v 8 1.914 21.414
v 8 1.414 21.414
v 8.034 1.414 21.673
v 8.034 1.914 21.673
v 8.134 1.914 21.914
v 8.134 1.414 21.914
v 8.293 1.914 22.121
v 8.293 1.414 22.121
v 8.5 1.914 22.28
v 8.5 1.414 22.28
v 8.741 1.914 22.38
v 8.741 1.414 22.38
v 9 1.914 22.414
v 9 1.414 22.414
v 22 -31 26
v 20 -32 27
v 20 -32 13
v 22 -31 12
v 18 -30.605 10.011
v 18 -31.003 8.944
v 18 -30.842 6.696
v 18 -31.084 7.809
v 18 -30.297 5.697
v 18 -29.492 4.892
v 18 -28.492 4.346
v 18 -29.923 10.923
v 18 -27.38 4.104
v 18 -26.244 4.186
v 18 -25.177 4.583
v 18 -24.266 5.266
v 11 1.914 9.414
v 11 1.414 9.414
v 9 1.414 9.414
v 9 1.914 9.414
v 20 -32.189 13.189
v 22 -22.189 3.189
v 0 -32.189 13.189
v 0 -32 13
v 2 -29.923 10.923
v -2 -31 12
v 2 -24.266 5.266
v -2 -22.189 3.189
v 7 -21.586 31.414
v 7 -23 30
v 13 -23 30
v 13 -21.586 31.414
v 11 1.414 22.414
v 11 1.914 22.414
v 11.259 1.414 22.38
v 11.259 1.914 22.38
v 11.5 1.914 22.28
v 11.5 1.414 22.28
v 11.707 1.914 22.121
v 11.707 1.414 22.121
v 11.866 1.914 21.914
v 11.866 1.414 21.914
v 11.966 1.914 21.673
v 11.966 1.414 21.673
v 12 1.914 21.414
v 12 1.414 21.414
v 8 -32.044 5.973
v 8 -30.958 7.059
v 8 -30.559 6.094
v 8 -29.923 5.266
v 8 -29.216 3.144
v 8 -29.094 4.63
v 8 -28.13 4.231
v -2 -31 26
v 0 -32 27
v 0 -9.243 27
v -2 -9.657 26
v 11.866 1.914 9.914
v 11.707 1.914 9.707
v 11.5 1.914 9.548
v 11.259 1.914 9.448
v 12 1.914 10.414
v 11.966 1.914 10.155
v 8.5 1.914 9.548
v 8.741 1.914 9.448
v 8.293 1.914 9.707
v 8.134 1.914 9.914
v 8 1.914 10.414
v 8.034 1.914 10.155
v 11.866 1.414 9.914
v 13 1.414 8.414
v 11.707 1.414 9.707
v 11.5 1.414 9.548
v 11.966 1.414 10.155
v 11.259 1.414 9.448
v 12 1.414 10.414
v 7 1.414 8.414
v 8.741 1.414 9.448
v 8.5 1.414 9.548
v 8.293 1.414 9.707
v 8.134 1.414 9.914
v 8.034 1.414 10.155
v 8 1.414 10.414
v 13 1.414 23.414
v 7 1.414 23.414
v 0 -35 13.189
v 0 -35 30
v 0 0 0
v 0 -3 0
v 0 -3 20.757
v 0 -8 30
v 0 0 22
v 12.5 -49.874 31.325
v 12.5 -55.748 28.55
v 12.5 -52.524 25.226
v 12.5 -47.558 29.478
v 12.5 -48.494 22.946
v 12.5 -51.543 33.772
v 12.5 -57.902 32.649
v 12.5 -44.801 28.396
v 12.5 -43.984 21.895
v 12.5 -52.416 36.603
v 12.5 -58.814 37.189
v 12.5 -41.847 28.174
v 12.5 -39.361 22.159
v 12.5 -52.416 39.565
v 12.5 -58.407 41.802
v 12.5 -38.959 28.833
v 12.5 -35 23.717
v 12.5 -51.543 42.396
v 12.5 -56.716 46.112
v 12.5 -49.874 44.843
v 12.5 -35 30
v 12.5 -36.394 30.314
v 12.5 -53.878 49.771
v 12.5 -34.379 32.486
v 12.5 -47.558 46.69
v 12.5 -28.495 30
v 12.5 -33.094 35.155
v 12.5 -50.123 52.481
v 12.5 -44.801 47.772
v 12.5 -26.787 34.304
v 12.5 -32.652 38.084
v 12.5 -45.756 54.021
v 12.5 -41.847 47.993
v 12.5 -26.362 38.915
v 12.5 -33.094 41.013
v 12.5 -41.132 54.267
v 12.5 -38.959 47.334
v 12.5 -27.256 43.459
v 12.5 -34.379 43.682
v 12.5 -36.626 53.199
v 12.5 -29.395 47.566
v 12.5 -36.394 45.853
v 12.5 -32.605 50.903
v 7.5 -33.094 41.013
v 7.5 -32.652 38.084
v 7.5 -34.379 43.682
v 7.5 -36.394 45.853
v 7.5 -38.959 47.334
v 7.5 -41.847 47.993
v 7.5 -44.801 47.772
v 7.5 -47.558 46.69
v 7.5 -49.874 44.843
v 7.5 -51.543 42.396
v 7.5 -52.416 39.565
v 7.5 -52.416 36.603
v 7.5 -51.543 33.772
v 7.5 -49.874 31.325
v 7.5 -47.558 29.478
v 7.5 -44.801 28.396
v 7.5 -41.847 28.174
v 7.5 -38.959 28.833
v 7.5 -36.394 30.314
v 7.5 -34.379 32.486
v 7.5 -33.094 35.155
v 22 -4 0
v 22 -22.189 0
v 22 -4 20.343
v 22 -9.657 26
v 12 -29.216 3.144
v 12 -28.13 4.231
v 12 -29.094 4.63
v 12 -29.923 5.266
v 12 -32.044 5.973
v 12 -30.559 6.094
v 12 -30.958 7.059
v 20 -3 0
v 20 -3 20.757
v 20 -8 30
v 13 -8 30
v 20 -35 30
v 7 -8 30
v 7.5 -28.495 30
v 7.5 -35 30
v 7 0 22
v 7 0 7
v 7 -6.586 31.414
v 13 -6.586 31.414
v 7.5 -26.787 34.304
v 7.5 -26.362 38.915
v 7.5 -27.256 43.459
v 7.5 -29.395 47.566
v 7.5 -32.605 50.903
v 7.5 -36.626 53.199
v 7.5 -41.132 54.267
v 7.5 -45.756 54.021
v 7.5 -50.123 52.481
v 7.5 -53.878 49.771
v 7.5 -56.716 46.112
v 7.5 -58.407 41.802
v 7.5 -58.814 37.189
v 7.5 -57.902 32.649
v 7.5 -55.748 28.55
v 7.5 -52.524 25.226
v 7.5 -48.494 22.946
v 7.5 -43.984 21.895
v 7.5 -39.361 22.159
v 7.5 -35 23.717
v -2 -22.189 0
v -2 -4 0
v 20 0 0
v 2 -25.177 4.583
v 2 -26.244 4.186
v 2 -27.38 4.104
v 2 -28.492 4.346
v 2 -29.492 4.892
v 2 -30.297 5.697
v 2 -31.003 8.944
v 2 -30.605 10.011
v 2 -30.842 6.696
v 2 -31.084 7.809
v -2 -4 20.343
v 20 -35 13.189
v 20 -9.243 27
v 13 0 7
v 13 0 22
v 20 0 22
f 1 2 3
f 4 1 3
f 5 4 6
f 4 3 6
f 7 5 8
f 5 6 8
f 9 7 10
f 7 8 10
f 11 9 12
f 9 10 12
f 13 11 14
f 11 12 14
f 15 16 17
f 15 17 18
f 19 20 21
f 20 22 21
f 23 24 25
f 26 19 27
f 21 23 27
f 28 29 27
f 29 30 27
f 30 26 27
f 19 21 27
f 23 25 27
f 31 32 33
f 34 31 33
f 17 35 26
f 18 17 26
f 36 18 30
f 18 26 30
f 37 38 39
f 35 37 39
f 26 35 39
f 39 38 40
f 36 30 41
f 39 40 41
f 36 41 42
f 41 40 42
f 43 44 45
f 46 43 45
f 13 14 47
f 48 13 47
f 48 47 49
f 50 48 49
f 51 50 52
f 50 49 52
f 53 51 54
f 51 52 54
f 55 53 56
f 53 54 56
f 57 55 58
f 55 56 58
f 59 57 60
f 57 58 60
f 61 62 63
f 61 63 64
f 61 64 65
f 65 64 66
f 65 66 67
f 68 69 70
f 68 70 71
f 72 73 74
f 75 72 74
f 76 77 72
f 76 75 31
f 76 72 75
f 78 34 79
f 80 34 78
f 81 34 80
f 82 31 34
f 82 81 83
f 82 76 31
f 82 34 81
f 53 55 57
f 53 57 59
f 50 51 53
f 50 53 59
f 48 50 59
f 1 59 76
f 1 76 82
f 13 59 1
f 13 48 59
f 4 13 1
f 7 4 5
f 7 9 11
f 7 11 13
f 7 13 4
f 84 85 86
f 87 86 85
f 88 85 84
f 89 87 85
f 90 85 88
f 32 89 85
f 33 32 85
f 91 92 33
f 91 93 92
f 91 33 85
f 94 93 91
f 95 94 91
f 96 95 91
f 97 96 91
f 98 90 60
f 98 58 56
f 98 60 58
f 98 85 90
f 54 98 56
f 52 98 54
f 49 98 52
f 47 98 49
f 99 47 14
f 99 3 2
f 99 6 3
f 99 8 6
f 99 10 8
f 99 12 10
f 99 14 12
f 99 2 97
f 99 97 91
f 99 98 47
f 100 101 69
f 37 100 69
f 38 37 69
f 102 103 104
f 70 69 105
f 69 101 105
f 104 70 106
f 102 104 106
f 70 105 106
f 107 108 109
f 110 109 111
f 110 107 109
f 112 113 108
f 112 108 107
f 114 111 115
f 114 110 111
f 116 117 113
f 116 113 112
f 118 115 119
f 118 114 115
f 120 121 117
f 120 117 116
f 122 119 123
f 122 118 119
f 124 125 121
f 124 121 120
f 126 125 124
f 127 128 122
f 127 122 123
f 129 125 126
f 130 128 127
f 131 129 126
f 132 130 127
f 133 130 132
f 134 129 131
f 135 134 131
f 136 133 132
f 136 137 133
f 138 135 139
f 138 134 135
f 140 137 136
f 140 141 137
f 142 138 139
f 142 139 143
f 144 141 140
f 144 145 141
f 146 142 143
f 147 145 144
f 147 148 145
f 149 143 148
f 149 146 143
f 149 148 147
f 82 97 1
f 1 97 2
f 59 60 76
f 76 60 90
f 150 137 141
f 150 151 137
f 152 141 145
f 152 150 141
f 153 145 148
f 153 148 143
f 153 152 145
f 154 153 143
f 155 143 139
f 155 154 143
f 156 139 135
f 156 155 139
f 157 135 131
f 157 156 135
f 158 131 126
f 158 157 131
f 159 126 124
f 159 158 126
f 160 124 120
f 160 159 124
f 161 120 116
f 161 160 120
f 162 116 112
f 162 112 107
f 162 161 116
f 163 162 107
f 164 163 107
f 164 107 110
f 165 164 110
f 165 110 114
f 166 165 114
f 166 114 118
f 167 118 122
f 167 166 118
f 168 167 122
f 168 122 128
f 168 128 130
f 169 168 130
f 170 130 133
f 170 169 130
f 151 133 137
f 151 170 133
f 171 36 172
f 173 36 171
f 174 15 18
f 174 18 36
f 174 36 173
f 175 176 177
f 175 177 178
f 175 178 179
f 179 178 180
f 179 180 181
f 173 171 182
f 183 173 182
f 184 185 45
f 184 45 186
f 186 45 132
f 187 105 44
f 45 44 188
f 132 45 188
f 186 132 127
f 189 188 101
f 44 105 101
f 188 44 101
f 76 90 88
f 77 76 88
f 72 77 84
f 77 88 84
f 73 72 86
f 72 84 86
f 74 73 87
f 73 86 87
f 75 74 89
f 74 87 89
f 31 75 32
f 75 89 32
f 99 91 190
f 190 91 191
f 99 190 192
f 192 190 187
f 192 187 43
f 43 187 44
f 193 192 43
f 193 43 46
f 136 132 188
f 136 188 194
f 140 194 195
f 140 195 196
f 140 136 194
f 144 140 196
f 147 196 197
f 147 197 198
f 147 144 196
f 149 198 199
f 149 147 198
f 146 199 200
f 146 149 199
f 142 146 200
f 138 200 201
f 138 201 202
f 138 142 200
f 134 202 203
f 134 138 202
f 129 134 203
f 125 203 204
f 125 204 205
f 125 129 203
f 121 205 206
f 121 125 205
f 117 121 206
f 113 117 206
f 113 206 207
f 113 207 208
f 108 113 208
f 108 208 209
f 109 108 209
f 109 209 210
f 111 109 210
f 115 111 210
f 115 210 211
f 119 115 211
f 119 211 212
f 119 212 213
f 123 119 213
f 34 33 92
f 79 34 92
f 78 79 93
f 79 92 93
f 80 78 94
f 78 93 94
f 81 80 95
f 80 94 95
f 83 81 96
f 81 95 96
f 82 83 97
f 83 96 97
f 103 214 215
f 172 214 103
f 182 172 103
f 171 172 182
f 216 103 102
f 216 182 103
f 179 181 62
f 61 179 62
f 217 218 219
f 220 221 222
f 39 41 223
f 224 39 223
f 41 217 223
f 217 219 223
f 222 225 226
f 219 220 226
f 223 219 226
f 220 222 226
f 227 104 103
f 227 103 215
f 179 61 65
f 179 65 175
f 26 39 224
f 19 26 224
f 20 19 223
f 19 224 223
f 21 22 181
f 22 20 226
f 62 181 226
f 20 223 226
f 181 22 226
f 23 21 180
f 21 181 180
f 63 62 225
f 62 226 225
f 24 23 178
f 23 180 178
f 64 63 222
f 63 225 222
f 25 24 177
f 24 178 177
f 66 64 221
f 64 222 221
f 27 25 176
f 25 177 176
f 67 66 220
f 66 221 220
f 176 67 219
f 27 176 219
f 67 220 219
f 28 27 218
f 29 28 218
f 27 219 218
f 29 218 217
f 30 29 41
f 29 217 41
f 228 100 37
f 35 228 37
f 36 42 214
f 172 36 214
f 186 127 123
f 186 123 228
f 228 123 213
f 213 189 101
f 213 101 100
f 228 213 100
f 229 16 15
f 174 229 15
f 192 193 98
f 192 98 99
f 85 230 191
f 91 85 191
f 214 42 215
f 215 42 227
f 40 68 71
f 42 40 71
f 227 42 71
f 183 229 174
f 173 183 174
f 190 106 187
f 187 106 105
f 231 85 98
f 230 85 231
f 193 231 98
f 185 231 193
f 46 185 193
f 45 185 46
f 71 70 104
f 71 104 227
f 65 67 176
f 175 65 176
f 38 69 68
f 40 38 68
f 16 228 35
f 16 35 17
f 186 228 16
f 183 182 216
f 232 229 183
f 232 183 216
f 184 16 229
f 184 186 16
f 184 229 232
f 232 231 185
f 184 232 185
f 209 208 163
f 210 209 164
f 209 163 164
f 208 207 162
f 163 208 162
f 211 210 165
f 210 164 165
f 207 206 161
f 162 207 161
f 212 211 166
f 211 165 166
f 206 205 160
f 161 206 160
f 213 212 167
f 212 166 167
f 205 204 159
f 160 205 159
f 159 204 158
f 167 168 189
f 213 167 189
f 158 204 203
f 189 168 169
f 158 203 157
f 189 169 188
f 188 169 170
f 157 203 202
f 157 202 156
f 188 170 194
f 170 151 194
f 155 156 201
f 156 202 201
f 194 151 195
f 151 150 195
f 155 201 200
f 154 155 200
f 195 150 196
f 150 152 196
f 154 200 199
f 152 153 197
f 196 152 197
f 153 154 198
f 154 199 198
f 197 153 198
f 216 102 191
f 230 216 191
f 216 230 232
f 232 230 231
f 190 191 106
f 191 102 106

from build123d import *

# Parameters (mm, degrees)
F2_DEPTH       = 20
F3_DEPTH       = 22
F3_DEPTH_BACK  = 2
F1_W           = 29
F1_H           = 3
F7_DEPTH       = 22
F7_DEPTH_BACK  = 2
F5_W           = 6
F5_H           = 11.313708499
F4_W           = 6
F4_H           = 15
F6_W           = 6
F6_H           = 15
F8_DEPTH       = 2
F10_DEPTH      = 25
F12_DEPTH      = 5
F15_DEPTH      = 0.5
F16_R          = 16.2487088964
F16_R_2        = 9.9373882072
F17_DEPTH      = 2.5
F17_DEPTH_BACK = 2.5
F18_T4_DEPTH   = 31.116674808
F18_T9_DEPTH   = 19.1877426199
F18_T14_DEPTH  = 33.116674808
F18_T19_DEPTH  = 24.3595810189
F18_T24_DEPTH  = 24.3595810189
F18_T29_DEPTH  = 33.116674808
F18_T34_DEPTH  = 19.1877426199
F18_T39_DEPTH  = 31.116674808


# Not quite as in the source:
# - a fillet or chamfer that OpenCascade refuses, or shapes differently, is made with other operations: its cross-section is extruded or revolved along the edge and cut away or added
# - two fillets or chamfers of one size are made in one step


with BuildPart() as f2:
    # F1 (on Right) → F2 (new body)
    with BuildSketch(Plane.YZ):
        Polygon((-35, 30), (-35, 0), (-32, 0), (-32, 3), (-32, 27), (-9.2426406871, 27), (-3, 20.7573593129), (-3, 3), (-3, 0), (0, 0), (0, 22), (-8, 30), align=None)
    extrude(amount=F2_DEPTH)

    # F1 (on Right) → F3 (join, two sides)
    with BuildSketch(Plane.YZ) as f3_sk:
        Polygon((-32, 27), (-32, 3), (-3, 3), (-3, 20.7573593129), (-9.2426406871, 27), align=None)
    extrude(amount=F3_DEPTH)
    extrude(f3_sk.sketch, amount=-F3_DEPTH_BACK)

    # F1 (on Right) → F7 (join, two sides)
    with BuildSketch(Plane.YZ) as f7_sk:
        with Locations((-17.5, 1.5)):
            Rectangle(F1_W, F1_H)
    extrude(amount=F7_DEPTH)
    extrude(f7_sk.sketch, amount=-F7_DEPTH_BACK)

    # F5 (on face) + F4 (on face) + F6 (on face) → F8 (join)
    with BuildSketch(Plane(origin=(0, 11, 11), x_dir=(-1, 0, 0), z_dir=(0, 0.7071067812, 0.7071067812))):
        with Locations((-10, 21.2132034356)):
            Rectangle(F5_W, F5_H)
    with BuildSketch(Plane(origin=(0, 0, 0), x_dir=(-1, 0, 0), z_dir=(0, 1, 0))):
        with Locations((-10, 14.5)):
            Rectangle(F4_W, F4_H)
    with BuildSketch(Plane.XY.offset(30)):
        with Locations((10, -15.5)):
            Rectangle(F6_W, F6_H)
    extrude(amount=F8_DEPTH, dir=(0, 0.7071067812, 0.7071067812))

    # F9 (on face) → F10 (cut)
    with BuildSketch(Plane(origin=(-2, 0, 0), x_dir=(0, -1, 0), z_dir=(-1, 0, 0))):
        Polygon((22.18895033, -6.8113151938), (42.18895033, -6.8113151938), (42.18895033, 13.1886848062), (32.18895033, 13.1886848062), (32, 12.9997344762), (32, 0), (22.18895033, 0), align=None)
        Polygon((22.18895033, 3.1886848062), (22.18895033, 0), (32, 0), (32, 12.9997344762), align=None)
    extrude(amount=-F10_DEPTH, mode=Mode.SUBTRACT)

    # F11 (on face) → F12 (join)
    with BuildSketch(Plane(origin=(0, -9.5001327619, -9.5001327619), x_dir=(1, 0, 0), z_dir=(0, -0.7071067812, -0.7071067812))):
        Polygon((8, 26.8821576475), (8, 24.8821576475), (8, 22.8821576475), (12, 22.8821576475), (12, 24.8821576475), (12, 26.8821576475), align=None)
    extrude(amount=F12_DEPTH)

    # F11 (on face) → F13 (revolve)
    with BuildSketch(Plane(origin=(0, -9.5001327619, -9.5001327619), x_dir=(1, 0, 0), z_dir=(0, -0.7071067812, -0.7071067812))):
        Polygon((2, 28.8821576475), (2, 24.8821576475), (8, 24.8821576475), (8, 26.8821576475), (12, 26.8821576475), (12, 24.8821576475), (18, 24.8821576475), (18, 28.8821576475), align=None)
    revolve(axis=Axis((5, -27.094475165, 8.0942096412), (1, 0, 0)))

    # F14 (on face) → F15 (join)
    with BuildSketch(Plane(origin=(0, 1.4142135624, 0), x_dir=(-1, 0, 0), z_dir=(0, 1, 0))):
        with BuildLine():
            Line((-12, 21.4142135624), (-12, 10.4142135624))
            ThreePointArc((-12, 10.4142135624), (-11.7071067812, 9.7071067812), (-11, 9.4142135624))
            Line((-11, 9.4142135624), (-9, 9.4142135624))
            ThreePointArc((-9, 9.4142135624), (-8.2928932188, 9.7071067812), (-8, 10.4142135624))
            Line((-8, 10.4142135624), (-8, 21.4142135624))
            ThreePointArc((-8, 21.4142135624), (-8.2928932188, 22.1213203436), (-9, 22.4142135624))
            Line((-9, 22.4142135624), (-11, 22.4142135624))
            ThreePointArc((-11, 22.4142135624), (-11.7071067812, 22.1213203436), (-12, 21.4142135624))
        make_face()
    extrude(amount=F15_DEPTH)

    # F16 (on offset) → F17 (join, two sides)
    with BuildSketch(Plane.YZ.offset(10)) as f17_sk:
        with Locations((-42.5896607339, 38.0838625133)):
            Circle(F16_R)
        with Locations((-42.5896607339, 38.0838625133)):
            Circle(F16_R_2, mode=Mode.SUBTRACT)
    extrude(amount=F17_DEPTH)
    extrude(f17_sk.sketch, amount=-F17_DEPTH_BACK)

    # F18: chamfer of 2 x 1 on 8 edges, made by hand


with BuildPart() as f18_tool2:
    # F18_s3 → F18_t4 (new body)
    with BuildSketch(Plane.XY.offset(-5.1796577476)):
        Polygon((0, -3), (-2, -4), (-2, -3), align=None)
    extrude(amount=F18_T4_DEPTH)

    split(bisect_by=Plane.YZ, keep=Keep.BOTTOM)


with BuildPart() as f2_1:
    add(f2.part)

    # F18_t1: cut F18_tool2
    add(f18_tool2.part, mode=Mode.SUBTRACT)


with BuildPart() as f18_tool7:
    # F18_s8 → F18_t9 (new body)
    with BuildSketch(Plane(origin=(0, -8.2161085389, 8.2161085389), x_dir=(1, 0, 0), z_dir=(0, -0.7071067812, 0.7071067812))):
        Polygon((0, 12.5563491861), (-2, 11.5563491861), (-2, 12.5563491861), align=None)
    extrude(amount=F18_T9_DEPTH)

    split(bisect_by=Plane.YZ, keep=Keep.BOTTOM)


with BuildPart() as f2_2:
    add(f2_1.part)

    # F18_t6: cut F18_tool7
    add(f18_tool7.part, mode=Mode.SUBTRACT)


with BuildPart() as f18_tool12:
    # F18_s13 → F18_t14 (new body)
    with BuildSketch(Plane.XZ.offset(4.0629829395)):
        Polygon((0, 27), (-2, 26), (-2, 27), align=None)
    extrude(amount=F18_T14_DEPTH)

    split(bisect_by=Plane.YZ, keep=Keep.BOTTOM)


with BuildPart() as f2_3:
    add(f2_2.part)

    # F18_t11: cut F18_tool12
    add(f18_tool12.part, mode=Mode.SUBTRACT)


with BuildPart() as f18_tool17:
    # F18_s18 → F18_t19 (new body)
    with BuildSketch(Plane.XY.offset(32.1796577476)):
        Polygon((0, -32), (-2, -31), (-2, -32), align=None)
    extrude(amount=-F18_T19_DEPTH)

    split(bisect_by=Plane.YZ, keep=Keep.BOTTOM)


with BuildPart() as f2_4:
    add(f2_3.part)

    # F18_t16: cut F18_tool17
    add(f18_tool17.part, mode=Mode.SUBTRACT)


with BuildPart() as f18_tool22:
    # F18_s23 → F18_t24 (new body)
    with BuildSketch(Plane.XY.offset(7.8200767286)):
        Polygon((20, -32), (22, -31), (22, -32), align=None)
    extrude(amount=F18_T24_DEPTH)

    split(bisect_by=Plane.YZ.offset(20), keep=Keep.TOP)


with BuildPart() as f2_5:
    add(f2_4.part)

    # F18_t21: cut F18_tool22
    add(f18_tool22.part, mode=Mode.SUBTRACT)


with BuildPart() as f18_tool27:
    # F18_s28 → F18_t29 (new body)
    with BuildSketch(Plane.XZ.offset(4.0629829395)):
        Polygon((20, 27), (22, 26), (22, 27), align=None)
    extrude(amount=F18_T29_DEPTH)

    split(bisect_by=Plane.YZ.offset(20), keep=Keep.TOP)


with BuildPart() as f2_6:
    add(f2_5.part)

    # F18_t26: cut F18_tool27
    add(f18_tool27.part, mode=Mode.SUBTRACT)


with BuildPart() as f18_tool32:
    # F18_s33 → F18_t34 (new body)
    with BuildSketch(Plane(origin=(0, -8.2161085389, 8.2161085389), x_dir=(1, 0, 0), z_dir=(0, -0.7071067812, 0.7071067812))):
        Polygon((20, 12.5563491861), (22, 11.5563491861), (22, 12.5563491861), align=None)
    extrude(amount=F18_T34_DEPTH)

    split(bisect_by=Plane.YZ.offset(20), keep=Keep.TOP)


with BuildPart() as f2_7:
    add(f2_6.part)

    # F18_t31: cut F18_tool32
    add(f18_tool32.part, mode=Mode.SUBTRACT)


with BuildPart() as f18_tool37:
    # F18_s38 → F18_t39 (new body)
    with BuildSketch(Plane.XY.offset(25.9370170605)):
        Polygon((22, -4), (20, -3), (22, -3), align=None)
    extrude(amount=-F18_T39_DEPTH)

    split(bisect_by=Plane.YZ.offset(20), keep=Keep.TOP)


with BuildPart() as f2_8:
    add(f2_7.part)

    # F18_t36: cut F18_tool37
    add(f18_tool37.part, mode=Mode.SUBTRACT)


solid = f2_8.part
